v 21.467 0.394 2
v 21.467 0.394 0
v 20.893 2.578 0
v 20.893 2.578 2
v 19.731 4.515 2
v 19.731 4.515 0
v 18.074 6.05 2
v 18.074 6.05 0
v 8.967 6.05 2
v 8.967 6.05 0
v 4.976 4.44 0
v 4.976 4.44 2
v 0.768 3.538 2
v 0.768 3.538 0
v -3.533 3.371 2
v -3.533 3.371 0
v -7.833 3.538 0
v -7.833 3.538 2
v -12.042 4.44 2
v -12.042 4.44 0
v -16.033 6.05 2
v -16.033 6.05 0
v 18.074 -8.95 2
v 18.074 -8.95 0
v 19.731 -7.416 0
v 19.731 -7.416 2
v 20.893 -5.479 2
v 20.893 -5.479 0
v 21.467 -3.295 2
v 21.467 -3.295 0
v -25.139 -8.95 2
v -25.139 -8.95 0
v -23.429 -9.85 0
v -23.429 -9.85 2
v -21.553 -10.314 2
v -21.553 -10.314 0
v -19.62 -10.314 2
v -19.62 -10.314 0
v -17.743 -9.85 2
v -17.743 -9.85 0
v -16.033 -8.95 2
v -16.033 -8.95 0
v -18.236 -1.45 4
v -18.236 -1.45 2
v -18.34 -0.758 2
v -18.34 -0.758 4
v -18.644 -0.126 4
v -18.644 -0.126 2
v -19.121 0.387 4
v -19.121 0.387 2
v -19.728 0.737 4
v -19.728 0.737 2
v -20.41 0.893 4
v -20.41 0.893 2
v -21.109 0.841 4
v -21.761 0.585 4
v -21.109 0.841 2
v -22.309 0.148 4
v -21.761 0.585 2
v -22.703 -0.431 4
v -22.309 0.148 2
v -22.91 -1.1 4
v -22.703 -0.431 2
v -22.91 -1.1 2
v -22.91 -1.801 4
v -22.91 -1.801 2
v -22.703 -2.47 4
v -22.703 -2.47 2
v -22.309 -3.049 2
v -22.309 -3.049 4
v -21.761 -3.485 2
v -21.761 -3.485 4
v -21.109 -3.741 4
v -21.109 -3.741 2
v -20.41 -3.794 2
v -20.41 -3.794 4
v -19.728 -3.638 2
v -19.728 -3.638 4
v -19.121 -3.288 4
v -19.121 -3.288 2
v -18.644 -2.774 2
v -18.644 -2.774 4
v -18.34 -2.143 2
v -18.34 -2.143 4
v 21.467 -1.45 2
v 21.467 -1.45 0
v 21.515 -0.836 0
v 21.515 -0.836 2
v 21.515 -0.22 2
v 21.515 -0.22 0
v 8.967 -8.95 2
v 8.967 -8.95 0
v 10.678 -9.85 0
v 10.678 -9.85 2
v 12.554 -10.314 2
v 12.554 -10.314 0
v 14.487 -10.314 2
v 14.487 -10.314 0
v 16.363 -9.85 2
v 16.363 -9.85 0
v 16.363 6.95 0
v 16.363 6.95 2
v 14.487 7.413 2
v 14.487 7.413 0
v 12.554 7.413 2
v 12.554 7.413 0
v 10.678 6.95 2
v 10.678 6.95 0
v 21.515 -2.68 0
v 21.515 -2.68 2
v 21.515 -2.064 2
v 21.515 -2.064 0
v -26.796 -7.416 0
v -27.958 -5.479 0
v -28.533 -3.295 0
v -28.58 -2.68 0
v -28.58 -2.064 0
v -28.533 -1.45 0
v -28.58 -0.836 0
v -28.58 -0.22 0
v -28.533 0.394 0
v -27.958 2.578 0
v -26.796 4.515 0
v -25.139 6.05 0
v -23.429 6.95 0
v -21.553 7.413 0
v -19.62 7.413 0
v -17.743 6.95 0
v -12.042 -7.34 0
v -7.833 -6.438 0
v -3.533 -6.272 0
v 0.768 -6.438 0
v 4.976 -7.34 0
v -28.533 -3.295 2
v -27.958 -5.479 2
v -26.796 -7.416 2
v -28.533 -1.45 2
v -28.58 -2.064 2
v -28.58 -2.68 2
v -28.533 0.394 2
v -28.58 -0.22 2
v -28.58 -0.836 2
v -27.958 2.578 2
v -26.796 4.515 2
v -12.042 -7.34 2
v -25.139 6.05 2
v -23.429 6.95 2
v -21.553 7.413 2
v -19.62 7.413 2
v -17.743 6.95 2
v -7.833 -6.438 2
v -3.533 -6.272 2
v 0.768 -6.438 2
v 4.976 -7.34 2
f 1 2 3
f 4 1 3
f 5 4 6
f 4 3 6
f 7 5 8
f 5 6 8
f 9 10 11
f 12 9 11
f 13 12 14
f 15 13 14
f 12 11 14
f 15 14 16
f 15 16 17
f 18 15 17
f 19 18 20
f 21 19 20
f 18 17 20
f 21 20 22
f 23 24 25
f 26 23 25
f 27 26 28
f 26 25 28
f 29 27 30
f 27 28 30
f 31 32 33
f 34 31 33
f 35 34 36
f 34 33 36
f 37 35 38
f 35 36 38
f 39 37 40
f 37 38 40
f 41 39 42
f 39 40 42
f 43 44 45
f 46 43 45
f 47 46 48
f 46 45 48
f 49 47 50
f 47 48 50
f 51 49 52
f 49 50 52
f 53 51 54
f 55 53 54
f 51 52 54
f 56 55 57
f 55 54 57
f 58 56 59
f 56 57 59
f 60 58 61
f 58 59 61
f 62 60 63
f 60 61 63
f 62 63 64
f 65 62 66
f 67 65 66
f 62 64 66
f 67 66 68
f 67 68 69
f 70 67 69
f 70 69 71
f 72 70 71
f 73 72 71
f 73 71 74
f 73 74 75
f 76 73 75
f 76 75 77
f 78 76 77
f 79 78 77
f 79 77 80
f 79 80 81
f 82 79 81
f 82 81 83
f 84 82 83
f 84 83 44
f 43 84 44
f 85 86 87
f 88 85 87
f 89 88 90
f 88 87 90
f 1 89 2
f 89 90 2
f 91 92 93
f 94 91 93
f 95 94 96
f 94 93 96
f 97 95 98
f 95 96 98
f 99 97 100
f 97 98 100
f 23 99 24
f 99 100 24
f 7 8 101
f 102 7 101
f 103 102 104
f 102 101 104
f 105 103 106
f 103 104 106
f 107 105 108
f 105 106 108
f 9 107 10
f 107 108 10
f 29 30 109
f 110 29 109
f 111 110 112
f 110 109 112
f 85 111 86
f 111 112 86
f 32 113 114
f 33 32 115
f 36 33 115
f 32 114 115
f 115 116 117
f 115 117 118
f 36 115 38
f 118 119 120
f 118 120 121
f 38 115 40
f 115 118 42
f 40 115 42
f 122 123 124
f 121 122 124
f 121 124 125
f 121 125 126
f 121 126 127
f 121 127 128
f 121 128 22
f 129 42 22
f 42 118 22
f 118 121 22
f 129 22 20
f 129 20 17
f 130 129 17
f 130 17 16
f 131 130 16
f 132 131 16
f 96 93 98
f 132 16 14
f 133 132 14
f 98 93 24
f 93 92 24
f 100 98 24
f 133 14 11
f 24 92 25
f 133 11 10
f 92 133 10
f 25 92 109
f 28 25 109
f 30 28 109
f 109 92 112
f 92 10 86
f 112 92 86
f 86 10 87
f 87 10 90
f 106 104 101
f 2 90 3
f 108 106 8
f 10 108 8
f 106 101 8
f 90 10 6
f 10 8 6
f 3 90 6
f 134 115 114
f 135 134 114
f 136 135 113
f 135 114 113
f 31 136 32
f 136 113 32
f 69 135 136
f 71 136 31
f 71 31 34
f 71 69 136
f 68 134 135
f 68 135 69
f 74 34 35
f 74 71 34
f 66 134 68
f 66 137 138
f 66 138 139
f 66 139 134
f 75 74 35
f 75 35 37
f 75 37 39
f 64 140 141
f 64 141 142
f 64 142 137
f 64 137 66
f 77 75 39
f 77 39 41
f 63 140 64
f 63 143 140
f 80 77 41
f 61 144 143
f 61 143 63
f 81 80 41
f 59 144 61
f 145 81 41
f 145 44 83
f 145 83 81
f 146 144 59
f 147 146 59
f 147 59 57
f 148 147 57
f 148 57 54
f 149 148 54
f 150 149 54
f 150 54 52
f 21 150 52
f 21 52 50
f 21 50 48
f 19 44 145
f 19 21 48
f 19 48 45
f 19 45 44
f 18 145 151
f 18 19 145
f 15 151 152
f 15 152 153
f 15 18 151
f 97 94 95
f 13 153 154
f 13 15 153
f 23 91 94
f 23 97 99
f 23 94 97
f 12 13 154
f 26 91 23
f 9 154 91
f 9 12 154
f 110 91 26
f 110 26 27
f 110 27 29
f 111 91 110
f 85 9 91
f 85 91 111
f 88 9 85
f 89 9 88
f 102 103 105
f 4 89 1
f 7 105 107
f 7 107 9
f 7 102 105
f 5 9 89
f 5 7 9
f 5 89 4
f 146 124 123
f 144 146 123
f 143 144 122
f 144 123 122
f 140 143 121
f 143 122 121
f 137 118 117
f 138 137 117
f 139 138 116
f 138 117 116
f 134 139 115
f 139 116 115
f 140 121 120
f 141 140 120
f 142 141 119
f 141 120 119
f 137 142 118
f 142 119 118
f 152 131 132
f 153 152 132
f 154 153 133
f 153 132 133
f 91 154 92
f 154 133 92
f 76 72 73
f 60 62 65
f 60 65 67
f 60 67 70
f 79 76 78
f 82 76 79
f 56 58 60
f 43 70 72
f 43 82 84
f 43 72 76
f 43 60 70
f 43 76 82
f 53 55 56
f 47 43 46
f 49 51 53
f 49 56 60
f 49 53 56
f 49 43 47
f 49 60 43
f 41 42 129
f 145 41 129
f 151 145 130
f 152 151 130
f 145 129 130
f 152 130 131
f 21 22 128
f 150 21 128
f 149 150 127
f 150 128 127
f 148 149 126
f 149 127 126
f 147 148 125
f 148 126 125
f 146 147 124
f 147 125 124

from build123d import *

# Parameters (mm, degrees)
F1_DEPTH = 2
F2_DEPTH = 4


with BuildPart() as f1:
    # F0 (on Top) → F1 (new body)
    with BuildSketch(Plane.XY):
        with BuildLine():
            ThreePointArc((18.0739206718, 6.0497422268), (13.5205869532, 7.4719650911), (8.9672532347, 6.0497422268))
            Line((8.9672532347, 6.0497422268), (18.0739206718, 6.0497422268))
        make_face()
        with BuildLine():
            Line((18.0739206718, 6.0497422268), (8.9672532347, 6.0497422268))
            ThreePointArc((8.9672532347, 6.0497422268), (2.8913578077, 3.8979685049), (-3.5327467653, 3.3711707982))
            Line((-3.5327467653, 3.3711707982), (-3.5327467653, -1.4502577732))
            Line((-3.5327467653, -1.4502577732), (21.4672532347, -1.4502577732))
            Line((21.4672532347, -1.4502577732), (21.4672532347, 0.3941879553))
            ThreePointArc((21.4672532347, 0.3941879553), (20.3805303589, 3.5879311345), (18.0739206718, 6.0497422268))
        make_face()
        with BuildLine():
            Line((-3.5327467653, -1.4502577732), (-3.5327467653, 3.3711707982))
            ThreePointArc((-3.5327467653, 3.3711707982), (-9.9568513384, 3.8979685049), (-16.0327467653, 6.0497422268))
            Line((-16.0327467653, 6.0497422268), (-25.1394142025, 6.0497422268))
            ThreePointArc((-25.1394142025, 6.0497422268), (-27.4460238896, 3.5879311345), (-28.5327467653, 0.3941879553))
            Line((-28.5327467653, 0.3941879553), (-28.5327467653, -1.4502577732))
            Line((-28.5327467653, -1.4502577732), (-22.9360804839, -1.4502577732))
            ThreePointArc((-22.9360804839, -1.4502577732), (-20.5860804839, 0.8997422268), (-18.2360804839, -1.4502577732))
            Line((-18.2360804839, -1.4502577732), (-3.5327467653, -1.4502577732))
        make_face()
        with BuildLine():
            Line((-25.1394142025, 6.0497422268), (-16.0327467653, 6.0497422268))
            ThreePointArc((-16.0327467653, 6.0497422268), (-20.5860804839, 7.4719650911), (-25.1394142025, 6.0497422268))
        make_face()
        with BuildLine():
            ThreePointArc((21.4672532347, -1.4502577732), (21.5205869532, -0.5280349089), (21.4672532347, 0.3941879553))
            Line((21.4672532347, 0.3941879553), (21.4672532347, -1.4502577732))
        make_face()
        with BuildLine():
            Line((21.4672532347, -1.4502577732), (-3.5327467653, -1.4502577732))
            Line((-3.5327467653, -1.4502577732), (-3.5327467653, -6.2716863446))
            ThreePointArc((-3.5327467653, -6.2716863446), (2.8913578077, -6.7984840513), (8.9672532347, -8.9502577732))
            Line((8.9672532347, -8.9502577732), (18.0739206718, -8.9502577732))
            ThreePointArc((18.0739206718, -8.9502577732), (20.3805303589, -6.4884466809), (21.4672532347, -3.2947035017))
            Line((21.4672532347, -3.2947035017), (21.4672532347, -1.4502577732))
        make_face()
        with BuildLine():
            Line((-3.5327467653, -6.2716863446), (-3.5327467653, -1.4502577732))
            Line((-3.5327467653, -1.4502577732), (-18.2360804839, -1.4502577732))
            ThreePointArc((-18.2360804839, -1.4502577732), (-20.5860804839, -3.8002577732), (-22.9360804839, -1.4502577732))
            Line((-22.9360804839, -1.4502577732), (-28.5327467653, -1.4502577732))
            Line((-28.5327467653, -1.4502577732), (-28.5327467653, -3.2947035017))
            ThreePointArc((-28.5327467653, -3.2947035017), (-27.4460238896, -6.4884466809), (-25.1394142025, -8.9502577732))
            Line((-25.1394142025, -8.9502577732), (-16.0327467653, -8.9502577732))
            ThreePointArc((-16.0327467653, -8.9502577732), (-9.9568513384, -6.7984840513), (-3.5327467653, -6.2716863446))
        make_face()
        with BuildLine():
            ThreePointArc((21.4672532347, -3.2947035017), (21.5205869532, -2.3724806375), (21.4672532347, -1.4502577732))
            Line((21.4672532347, -1.4502577732), (21.4672532347, -3.2947035017))
        make_face()
        with BuildLine():
            Line((-28.5327467653, -1.4502577732), (-28.5327467653, 0.3941879553))
            ThreePointArc((-28.5327467653, 0.3941879553), (-28.5860804839, -0.5280349089), (-28.5327467653, -1.4502577732))
        make_face()
        with BuildLine():
            ThreePointArc((-25.1394142025, -8.9502577732), (-20.5860804839, -10.3724806375), (-16.0327467653, -8.9502577732))
            Line((-16.0327467653, -8.9502577732), (-25.1394142025, -8.9502577732))
        make_face()
        with BuildLine():
            Line((18.0739206718, -8.9502577732), (8.9672532347, -8.9502577732))
            ThreePointArc((8.9672532347, -8.9502577732), (13.5205869532, -10.3724806375), (18.0739206718, -8.9502577732))
        make_face()
        with BuildLine():
            Line((-28.5327467653, -3.2947035017), (-28.5327467653, -1.4502577732))
            ThreePointArc((-28.5327467653, -1.4502577732), (-28.5860804839, -2.3724806375), (-28.5327467653, -3.2947035017))
        make_face()
    extrude(amount=F1_DEPTH)

    # F0 (on Top) → F2 (join)
    with BuildSketch(Plane.XY):
        with BuildLine():
            ThreePointArc((-22.9360804839, -1.4502577732), (-20.5860804839, -3.8002577732), (-18.2360804839, -1.4502577732))
            Line((-18.2360804839, -1.4502577732), (-20.5860804839, -1.4502577732))
            Line((-20.5860804839, -1.4502577732), (-22.9360804839, -1.4502577732))
        make_face()
        with BuildLine():
            Line((-20.5860804839, -1.4502577732), (-18.2360804839, -1.4502577732))
            ThreePointArc((-18.2360804839, -1.4502577732), (-20.5860804839, 0.8997422268), (-22.9360804839, -1.4502577732))
            Line((-22.9360804839, -1.4502577732), (-20.5860804839, -1.4502577732))
        make_face()
    extrude(amount=F2_DEPTH)


solid = f1.part
